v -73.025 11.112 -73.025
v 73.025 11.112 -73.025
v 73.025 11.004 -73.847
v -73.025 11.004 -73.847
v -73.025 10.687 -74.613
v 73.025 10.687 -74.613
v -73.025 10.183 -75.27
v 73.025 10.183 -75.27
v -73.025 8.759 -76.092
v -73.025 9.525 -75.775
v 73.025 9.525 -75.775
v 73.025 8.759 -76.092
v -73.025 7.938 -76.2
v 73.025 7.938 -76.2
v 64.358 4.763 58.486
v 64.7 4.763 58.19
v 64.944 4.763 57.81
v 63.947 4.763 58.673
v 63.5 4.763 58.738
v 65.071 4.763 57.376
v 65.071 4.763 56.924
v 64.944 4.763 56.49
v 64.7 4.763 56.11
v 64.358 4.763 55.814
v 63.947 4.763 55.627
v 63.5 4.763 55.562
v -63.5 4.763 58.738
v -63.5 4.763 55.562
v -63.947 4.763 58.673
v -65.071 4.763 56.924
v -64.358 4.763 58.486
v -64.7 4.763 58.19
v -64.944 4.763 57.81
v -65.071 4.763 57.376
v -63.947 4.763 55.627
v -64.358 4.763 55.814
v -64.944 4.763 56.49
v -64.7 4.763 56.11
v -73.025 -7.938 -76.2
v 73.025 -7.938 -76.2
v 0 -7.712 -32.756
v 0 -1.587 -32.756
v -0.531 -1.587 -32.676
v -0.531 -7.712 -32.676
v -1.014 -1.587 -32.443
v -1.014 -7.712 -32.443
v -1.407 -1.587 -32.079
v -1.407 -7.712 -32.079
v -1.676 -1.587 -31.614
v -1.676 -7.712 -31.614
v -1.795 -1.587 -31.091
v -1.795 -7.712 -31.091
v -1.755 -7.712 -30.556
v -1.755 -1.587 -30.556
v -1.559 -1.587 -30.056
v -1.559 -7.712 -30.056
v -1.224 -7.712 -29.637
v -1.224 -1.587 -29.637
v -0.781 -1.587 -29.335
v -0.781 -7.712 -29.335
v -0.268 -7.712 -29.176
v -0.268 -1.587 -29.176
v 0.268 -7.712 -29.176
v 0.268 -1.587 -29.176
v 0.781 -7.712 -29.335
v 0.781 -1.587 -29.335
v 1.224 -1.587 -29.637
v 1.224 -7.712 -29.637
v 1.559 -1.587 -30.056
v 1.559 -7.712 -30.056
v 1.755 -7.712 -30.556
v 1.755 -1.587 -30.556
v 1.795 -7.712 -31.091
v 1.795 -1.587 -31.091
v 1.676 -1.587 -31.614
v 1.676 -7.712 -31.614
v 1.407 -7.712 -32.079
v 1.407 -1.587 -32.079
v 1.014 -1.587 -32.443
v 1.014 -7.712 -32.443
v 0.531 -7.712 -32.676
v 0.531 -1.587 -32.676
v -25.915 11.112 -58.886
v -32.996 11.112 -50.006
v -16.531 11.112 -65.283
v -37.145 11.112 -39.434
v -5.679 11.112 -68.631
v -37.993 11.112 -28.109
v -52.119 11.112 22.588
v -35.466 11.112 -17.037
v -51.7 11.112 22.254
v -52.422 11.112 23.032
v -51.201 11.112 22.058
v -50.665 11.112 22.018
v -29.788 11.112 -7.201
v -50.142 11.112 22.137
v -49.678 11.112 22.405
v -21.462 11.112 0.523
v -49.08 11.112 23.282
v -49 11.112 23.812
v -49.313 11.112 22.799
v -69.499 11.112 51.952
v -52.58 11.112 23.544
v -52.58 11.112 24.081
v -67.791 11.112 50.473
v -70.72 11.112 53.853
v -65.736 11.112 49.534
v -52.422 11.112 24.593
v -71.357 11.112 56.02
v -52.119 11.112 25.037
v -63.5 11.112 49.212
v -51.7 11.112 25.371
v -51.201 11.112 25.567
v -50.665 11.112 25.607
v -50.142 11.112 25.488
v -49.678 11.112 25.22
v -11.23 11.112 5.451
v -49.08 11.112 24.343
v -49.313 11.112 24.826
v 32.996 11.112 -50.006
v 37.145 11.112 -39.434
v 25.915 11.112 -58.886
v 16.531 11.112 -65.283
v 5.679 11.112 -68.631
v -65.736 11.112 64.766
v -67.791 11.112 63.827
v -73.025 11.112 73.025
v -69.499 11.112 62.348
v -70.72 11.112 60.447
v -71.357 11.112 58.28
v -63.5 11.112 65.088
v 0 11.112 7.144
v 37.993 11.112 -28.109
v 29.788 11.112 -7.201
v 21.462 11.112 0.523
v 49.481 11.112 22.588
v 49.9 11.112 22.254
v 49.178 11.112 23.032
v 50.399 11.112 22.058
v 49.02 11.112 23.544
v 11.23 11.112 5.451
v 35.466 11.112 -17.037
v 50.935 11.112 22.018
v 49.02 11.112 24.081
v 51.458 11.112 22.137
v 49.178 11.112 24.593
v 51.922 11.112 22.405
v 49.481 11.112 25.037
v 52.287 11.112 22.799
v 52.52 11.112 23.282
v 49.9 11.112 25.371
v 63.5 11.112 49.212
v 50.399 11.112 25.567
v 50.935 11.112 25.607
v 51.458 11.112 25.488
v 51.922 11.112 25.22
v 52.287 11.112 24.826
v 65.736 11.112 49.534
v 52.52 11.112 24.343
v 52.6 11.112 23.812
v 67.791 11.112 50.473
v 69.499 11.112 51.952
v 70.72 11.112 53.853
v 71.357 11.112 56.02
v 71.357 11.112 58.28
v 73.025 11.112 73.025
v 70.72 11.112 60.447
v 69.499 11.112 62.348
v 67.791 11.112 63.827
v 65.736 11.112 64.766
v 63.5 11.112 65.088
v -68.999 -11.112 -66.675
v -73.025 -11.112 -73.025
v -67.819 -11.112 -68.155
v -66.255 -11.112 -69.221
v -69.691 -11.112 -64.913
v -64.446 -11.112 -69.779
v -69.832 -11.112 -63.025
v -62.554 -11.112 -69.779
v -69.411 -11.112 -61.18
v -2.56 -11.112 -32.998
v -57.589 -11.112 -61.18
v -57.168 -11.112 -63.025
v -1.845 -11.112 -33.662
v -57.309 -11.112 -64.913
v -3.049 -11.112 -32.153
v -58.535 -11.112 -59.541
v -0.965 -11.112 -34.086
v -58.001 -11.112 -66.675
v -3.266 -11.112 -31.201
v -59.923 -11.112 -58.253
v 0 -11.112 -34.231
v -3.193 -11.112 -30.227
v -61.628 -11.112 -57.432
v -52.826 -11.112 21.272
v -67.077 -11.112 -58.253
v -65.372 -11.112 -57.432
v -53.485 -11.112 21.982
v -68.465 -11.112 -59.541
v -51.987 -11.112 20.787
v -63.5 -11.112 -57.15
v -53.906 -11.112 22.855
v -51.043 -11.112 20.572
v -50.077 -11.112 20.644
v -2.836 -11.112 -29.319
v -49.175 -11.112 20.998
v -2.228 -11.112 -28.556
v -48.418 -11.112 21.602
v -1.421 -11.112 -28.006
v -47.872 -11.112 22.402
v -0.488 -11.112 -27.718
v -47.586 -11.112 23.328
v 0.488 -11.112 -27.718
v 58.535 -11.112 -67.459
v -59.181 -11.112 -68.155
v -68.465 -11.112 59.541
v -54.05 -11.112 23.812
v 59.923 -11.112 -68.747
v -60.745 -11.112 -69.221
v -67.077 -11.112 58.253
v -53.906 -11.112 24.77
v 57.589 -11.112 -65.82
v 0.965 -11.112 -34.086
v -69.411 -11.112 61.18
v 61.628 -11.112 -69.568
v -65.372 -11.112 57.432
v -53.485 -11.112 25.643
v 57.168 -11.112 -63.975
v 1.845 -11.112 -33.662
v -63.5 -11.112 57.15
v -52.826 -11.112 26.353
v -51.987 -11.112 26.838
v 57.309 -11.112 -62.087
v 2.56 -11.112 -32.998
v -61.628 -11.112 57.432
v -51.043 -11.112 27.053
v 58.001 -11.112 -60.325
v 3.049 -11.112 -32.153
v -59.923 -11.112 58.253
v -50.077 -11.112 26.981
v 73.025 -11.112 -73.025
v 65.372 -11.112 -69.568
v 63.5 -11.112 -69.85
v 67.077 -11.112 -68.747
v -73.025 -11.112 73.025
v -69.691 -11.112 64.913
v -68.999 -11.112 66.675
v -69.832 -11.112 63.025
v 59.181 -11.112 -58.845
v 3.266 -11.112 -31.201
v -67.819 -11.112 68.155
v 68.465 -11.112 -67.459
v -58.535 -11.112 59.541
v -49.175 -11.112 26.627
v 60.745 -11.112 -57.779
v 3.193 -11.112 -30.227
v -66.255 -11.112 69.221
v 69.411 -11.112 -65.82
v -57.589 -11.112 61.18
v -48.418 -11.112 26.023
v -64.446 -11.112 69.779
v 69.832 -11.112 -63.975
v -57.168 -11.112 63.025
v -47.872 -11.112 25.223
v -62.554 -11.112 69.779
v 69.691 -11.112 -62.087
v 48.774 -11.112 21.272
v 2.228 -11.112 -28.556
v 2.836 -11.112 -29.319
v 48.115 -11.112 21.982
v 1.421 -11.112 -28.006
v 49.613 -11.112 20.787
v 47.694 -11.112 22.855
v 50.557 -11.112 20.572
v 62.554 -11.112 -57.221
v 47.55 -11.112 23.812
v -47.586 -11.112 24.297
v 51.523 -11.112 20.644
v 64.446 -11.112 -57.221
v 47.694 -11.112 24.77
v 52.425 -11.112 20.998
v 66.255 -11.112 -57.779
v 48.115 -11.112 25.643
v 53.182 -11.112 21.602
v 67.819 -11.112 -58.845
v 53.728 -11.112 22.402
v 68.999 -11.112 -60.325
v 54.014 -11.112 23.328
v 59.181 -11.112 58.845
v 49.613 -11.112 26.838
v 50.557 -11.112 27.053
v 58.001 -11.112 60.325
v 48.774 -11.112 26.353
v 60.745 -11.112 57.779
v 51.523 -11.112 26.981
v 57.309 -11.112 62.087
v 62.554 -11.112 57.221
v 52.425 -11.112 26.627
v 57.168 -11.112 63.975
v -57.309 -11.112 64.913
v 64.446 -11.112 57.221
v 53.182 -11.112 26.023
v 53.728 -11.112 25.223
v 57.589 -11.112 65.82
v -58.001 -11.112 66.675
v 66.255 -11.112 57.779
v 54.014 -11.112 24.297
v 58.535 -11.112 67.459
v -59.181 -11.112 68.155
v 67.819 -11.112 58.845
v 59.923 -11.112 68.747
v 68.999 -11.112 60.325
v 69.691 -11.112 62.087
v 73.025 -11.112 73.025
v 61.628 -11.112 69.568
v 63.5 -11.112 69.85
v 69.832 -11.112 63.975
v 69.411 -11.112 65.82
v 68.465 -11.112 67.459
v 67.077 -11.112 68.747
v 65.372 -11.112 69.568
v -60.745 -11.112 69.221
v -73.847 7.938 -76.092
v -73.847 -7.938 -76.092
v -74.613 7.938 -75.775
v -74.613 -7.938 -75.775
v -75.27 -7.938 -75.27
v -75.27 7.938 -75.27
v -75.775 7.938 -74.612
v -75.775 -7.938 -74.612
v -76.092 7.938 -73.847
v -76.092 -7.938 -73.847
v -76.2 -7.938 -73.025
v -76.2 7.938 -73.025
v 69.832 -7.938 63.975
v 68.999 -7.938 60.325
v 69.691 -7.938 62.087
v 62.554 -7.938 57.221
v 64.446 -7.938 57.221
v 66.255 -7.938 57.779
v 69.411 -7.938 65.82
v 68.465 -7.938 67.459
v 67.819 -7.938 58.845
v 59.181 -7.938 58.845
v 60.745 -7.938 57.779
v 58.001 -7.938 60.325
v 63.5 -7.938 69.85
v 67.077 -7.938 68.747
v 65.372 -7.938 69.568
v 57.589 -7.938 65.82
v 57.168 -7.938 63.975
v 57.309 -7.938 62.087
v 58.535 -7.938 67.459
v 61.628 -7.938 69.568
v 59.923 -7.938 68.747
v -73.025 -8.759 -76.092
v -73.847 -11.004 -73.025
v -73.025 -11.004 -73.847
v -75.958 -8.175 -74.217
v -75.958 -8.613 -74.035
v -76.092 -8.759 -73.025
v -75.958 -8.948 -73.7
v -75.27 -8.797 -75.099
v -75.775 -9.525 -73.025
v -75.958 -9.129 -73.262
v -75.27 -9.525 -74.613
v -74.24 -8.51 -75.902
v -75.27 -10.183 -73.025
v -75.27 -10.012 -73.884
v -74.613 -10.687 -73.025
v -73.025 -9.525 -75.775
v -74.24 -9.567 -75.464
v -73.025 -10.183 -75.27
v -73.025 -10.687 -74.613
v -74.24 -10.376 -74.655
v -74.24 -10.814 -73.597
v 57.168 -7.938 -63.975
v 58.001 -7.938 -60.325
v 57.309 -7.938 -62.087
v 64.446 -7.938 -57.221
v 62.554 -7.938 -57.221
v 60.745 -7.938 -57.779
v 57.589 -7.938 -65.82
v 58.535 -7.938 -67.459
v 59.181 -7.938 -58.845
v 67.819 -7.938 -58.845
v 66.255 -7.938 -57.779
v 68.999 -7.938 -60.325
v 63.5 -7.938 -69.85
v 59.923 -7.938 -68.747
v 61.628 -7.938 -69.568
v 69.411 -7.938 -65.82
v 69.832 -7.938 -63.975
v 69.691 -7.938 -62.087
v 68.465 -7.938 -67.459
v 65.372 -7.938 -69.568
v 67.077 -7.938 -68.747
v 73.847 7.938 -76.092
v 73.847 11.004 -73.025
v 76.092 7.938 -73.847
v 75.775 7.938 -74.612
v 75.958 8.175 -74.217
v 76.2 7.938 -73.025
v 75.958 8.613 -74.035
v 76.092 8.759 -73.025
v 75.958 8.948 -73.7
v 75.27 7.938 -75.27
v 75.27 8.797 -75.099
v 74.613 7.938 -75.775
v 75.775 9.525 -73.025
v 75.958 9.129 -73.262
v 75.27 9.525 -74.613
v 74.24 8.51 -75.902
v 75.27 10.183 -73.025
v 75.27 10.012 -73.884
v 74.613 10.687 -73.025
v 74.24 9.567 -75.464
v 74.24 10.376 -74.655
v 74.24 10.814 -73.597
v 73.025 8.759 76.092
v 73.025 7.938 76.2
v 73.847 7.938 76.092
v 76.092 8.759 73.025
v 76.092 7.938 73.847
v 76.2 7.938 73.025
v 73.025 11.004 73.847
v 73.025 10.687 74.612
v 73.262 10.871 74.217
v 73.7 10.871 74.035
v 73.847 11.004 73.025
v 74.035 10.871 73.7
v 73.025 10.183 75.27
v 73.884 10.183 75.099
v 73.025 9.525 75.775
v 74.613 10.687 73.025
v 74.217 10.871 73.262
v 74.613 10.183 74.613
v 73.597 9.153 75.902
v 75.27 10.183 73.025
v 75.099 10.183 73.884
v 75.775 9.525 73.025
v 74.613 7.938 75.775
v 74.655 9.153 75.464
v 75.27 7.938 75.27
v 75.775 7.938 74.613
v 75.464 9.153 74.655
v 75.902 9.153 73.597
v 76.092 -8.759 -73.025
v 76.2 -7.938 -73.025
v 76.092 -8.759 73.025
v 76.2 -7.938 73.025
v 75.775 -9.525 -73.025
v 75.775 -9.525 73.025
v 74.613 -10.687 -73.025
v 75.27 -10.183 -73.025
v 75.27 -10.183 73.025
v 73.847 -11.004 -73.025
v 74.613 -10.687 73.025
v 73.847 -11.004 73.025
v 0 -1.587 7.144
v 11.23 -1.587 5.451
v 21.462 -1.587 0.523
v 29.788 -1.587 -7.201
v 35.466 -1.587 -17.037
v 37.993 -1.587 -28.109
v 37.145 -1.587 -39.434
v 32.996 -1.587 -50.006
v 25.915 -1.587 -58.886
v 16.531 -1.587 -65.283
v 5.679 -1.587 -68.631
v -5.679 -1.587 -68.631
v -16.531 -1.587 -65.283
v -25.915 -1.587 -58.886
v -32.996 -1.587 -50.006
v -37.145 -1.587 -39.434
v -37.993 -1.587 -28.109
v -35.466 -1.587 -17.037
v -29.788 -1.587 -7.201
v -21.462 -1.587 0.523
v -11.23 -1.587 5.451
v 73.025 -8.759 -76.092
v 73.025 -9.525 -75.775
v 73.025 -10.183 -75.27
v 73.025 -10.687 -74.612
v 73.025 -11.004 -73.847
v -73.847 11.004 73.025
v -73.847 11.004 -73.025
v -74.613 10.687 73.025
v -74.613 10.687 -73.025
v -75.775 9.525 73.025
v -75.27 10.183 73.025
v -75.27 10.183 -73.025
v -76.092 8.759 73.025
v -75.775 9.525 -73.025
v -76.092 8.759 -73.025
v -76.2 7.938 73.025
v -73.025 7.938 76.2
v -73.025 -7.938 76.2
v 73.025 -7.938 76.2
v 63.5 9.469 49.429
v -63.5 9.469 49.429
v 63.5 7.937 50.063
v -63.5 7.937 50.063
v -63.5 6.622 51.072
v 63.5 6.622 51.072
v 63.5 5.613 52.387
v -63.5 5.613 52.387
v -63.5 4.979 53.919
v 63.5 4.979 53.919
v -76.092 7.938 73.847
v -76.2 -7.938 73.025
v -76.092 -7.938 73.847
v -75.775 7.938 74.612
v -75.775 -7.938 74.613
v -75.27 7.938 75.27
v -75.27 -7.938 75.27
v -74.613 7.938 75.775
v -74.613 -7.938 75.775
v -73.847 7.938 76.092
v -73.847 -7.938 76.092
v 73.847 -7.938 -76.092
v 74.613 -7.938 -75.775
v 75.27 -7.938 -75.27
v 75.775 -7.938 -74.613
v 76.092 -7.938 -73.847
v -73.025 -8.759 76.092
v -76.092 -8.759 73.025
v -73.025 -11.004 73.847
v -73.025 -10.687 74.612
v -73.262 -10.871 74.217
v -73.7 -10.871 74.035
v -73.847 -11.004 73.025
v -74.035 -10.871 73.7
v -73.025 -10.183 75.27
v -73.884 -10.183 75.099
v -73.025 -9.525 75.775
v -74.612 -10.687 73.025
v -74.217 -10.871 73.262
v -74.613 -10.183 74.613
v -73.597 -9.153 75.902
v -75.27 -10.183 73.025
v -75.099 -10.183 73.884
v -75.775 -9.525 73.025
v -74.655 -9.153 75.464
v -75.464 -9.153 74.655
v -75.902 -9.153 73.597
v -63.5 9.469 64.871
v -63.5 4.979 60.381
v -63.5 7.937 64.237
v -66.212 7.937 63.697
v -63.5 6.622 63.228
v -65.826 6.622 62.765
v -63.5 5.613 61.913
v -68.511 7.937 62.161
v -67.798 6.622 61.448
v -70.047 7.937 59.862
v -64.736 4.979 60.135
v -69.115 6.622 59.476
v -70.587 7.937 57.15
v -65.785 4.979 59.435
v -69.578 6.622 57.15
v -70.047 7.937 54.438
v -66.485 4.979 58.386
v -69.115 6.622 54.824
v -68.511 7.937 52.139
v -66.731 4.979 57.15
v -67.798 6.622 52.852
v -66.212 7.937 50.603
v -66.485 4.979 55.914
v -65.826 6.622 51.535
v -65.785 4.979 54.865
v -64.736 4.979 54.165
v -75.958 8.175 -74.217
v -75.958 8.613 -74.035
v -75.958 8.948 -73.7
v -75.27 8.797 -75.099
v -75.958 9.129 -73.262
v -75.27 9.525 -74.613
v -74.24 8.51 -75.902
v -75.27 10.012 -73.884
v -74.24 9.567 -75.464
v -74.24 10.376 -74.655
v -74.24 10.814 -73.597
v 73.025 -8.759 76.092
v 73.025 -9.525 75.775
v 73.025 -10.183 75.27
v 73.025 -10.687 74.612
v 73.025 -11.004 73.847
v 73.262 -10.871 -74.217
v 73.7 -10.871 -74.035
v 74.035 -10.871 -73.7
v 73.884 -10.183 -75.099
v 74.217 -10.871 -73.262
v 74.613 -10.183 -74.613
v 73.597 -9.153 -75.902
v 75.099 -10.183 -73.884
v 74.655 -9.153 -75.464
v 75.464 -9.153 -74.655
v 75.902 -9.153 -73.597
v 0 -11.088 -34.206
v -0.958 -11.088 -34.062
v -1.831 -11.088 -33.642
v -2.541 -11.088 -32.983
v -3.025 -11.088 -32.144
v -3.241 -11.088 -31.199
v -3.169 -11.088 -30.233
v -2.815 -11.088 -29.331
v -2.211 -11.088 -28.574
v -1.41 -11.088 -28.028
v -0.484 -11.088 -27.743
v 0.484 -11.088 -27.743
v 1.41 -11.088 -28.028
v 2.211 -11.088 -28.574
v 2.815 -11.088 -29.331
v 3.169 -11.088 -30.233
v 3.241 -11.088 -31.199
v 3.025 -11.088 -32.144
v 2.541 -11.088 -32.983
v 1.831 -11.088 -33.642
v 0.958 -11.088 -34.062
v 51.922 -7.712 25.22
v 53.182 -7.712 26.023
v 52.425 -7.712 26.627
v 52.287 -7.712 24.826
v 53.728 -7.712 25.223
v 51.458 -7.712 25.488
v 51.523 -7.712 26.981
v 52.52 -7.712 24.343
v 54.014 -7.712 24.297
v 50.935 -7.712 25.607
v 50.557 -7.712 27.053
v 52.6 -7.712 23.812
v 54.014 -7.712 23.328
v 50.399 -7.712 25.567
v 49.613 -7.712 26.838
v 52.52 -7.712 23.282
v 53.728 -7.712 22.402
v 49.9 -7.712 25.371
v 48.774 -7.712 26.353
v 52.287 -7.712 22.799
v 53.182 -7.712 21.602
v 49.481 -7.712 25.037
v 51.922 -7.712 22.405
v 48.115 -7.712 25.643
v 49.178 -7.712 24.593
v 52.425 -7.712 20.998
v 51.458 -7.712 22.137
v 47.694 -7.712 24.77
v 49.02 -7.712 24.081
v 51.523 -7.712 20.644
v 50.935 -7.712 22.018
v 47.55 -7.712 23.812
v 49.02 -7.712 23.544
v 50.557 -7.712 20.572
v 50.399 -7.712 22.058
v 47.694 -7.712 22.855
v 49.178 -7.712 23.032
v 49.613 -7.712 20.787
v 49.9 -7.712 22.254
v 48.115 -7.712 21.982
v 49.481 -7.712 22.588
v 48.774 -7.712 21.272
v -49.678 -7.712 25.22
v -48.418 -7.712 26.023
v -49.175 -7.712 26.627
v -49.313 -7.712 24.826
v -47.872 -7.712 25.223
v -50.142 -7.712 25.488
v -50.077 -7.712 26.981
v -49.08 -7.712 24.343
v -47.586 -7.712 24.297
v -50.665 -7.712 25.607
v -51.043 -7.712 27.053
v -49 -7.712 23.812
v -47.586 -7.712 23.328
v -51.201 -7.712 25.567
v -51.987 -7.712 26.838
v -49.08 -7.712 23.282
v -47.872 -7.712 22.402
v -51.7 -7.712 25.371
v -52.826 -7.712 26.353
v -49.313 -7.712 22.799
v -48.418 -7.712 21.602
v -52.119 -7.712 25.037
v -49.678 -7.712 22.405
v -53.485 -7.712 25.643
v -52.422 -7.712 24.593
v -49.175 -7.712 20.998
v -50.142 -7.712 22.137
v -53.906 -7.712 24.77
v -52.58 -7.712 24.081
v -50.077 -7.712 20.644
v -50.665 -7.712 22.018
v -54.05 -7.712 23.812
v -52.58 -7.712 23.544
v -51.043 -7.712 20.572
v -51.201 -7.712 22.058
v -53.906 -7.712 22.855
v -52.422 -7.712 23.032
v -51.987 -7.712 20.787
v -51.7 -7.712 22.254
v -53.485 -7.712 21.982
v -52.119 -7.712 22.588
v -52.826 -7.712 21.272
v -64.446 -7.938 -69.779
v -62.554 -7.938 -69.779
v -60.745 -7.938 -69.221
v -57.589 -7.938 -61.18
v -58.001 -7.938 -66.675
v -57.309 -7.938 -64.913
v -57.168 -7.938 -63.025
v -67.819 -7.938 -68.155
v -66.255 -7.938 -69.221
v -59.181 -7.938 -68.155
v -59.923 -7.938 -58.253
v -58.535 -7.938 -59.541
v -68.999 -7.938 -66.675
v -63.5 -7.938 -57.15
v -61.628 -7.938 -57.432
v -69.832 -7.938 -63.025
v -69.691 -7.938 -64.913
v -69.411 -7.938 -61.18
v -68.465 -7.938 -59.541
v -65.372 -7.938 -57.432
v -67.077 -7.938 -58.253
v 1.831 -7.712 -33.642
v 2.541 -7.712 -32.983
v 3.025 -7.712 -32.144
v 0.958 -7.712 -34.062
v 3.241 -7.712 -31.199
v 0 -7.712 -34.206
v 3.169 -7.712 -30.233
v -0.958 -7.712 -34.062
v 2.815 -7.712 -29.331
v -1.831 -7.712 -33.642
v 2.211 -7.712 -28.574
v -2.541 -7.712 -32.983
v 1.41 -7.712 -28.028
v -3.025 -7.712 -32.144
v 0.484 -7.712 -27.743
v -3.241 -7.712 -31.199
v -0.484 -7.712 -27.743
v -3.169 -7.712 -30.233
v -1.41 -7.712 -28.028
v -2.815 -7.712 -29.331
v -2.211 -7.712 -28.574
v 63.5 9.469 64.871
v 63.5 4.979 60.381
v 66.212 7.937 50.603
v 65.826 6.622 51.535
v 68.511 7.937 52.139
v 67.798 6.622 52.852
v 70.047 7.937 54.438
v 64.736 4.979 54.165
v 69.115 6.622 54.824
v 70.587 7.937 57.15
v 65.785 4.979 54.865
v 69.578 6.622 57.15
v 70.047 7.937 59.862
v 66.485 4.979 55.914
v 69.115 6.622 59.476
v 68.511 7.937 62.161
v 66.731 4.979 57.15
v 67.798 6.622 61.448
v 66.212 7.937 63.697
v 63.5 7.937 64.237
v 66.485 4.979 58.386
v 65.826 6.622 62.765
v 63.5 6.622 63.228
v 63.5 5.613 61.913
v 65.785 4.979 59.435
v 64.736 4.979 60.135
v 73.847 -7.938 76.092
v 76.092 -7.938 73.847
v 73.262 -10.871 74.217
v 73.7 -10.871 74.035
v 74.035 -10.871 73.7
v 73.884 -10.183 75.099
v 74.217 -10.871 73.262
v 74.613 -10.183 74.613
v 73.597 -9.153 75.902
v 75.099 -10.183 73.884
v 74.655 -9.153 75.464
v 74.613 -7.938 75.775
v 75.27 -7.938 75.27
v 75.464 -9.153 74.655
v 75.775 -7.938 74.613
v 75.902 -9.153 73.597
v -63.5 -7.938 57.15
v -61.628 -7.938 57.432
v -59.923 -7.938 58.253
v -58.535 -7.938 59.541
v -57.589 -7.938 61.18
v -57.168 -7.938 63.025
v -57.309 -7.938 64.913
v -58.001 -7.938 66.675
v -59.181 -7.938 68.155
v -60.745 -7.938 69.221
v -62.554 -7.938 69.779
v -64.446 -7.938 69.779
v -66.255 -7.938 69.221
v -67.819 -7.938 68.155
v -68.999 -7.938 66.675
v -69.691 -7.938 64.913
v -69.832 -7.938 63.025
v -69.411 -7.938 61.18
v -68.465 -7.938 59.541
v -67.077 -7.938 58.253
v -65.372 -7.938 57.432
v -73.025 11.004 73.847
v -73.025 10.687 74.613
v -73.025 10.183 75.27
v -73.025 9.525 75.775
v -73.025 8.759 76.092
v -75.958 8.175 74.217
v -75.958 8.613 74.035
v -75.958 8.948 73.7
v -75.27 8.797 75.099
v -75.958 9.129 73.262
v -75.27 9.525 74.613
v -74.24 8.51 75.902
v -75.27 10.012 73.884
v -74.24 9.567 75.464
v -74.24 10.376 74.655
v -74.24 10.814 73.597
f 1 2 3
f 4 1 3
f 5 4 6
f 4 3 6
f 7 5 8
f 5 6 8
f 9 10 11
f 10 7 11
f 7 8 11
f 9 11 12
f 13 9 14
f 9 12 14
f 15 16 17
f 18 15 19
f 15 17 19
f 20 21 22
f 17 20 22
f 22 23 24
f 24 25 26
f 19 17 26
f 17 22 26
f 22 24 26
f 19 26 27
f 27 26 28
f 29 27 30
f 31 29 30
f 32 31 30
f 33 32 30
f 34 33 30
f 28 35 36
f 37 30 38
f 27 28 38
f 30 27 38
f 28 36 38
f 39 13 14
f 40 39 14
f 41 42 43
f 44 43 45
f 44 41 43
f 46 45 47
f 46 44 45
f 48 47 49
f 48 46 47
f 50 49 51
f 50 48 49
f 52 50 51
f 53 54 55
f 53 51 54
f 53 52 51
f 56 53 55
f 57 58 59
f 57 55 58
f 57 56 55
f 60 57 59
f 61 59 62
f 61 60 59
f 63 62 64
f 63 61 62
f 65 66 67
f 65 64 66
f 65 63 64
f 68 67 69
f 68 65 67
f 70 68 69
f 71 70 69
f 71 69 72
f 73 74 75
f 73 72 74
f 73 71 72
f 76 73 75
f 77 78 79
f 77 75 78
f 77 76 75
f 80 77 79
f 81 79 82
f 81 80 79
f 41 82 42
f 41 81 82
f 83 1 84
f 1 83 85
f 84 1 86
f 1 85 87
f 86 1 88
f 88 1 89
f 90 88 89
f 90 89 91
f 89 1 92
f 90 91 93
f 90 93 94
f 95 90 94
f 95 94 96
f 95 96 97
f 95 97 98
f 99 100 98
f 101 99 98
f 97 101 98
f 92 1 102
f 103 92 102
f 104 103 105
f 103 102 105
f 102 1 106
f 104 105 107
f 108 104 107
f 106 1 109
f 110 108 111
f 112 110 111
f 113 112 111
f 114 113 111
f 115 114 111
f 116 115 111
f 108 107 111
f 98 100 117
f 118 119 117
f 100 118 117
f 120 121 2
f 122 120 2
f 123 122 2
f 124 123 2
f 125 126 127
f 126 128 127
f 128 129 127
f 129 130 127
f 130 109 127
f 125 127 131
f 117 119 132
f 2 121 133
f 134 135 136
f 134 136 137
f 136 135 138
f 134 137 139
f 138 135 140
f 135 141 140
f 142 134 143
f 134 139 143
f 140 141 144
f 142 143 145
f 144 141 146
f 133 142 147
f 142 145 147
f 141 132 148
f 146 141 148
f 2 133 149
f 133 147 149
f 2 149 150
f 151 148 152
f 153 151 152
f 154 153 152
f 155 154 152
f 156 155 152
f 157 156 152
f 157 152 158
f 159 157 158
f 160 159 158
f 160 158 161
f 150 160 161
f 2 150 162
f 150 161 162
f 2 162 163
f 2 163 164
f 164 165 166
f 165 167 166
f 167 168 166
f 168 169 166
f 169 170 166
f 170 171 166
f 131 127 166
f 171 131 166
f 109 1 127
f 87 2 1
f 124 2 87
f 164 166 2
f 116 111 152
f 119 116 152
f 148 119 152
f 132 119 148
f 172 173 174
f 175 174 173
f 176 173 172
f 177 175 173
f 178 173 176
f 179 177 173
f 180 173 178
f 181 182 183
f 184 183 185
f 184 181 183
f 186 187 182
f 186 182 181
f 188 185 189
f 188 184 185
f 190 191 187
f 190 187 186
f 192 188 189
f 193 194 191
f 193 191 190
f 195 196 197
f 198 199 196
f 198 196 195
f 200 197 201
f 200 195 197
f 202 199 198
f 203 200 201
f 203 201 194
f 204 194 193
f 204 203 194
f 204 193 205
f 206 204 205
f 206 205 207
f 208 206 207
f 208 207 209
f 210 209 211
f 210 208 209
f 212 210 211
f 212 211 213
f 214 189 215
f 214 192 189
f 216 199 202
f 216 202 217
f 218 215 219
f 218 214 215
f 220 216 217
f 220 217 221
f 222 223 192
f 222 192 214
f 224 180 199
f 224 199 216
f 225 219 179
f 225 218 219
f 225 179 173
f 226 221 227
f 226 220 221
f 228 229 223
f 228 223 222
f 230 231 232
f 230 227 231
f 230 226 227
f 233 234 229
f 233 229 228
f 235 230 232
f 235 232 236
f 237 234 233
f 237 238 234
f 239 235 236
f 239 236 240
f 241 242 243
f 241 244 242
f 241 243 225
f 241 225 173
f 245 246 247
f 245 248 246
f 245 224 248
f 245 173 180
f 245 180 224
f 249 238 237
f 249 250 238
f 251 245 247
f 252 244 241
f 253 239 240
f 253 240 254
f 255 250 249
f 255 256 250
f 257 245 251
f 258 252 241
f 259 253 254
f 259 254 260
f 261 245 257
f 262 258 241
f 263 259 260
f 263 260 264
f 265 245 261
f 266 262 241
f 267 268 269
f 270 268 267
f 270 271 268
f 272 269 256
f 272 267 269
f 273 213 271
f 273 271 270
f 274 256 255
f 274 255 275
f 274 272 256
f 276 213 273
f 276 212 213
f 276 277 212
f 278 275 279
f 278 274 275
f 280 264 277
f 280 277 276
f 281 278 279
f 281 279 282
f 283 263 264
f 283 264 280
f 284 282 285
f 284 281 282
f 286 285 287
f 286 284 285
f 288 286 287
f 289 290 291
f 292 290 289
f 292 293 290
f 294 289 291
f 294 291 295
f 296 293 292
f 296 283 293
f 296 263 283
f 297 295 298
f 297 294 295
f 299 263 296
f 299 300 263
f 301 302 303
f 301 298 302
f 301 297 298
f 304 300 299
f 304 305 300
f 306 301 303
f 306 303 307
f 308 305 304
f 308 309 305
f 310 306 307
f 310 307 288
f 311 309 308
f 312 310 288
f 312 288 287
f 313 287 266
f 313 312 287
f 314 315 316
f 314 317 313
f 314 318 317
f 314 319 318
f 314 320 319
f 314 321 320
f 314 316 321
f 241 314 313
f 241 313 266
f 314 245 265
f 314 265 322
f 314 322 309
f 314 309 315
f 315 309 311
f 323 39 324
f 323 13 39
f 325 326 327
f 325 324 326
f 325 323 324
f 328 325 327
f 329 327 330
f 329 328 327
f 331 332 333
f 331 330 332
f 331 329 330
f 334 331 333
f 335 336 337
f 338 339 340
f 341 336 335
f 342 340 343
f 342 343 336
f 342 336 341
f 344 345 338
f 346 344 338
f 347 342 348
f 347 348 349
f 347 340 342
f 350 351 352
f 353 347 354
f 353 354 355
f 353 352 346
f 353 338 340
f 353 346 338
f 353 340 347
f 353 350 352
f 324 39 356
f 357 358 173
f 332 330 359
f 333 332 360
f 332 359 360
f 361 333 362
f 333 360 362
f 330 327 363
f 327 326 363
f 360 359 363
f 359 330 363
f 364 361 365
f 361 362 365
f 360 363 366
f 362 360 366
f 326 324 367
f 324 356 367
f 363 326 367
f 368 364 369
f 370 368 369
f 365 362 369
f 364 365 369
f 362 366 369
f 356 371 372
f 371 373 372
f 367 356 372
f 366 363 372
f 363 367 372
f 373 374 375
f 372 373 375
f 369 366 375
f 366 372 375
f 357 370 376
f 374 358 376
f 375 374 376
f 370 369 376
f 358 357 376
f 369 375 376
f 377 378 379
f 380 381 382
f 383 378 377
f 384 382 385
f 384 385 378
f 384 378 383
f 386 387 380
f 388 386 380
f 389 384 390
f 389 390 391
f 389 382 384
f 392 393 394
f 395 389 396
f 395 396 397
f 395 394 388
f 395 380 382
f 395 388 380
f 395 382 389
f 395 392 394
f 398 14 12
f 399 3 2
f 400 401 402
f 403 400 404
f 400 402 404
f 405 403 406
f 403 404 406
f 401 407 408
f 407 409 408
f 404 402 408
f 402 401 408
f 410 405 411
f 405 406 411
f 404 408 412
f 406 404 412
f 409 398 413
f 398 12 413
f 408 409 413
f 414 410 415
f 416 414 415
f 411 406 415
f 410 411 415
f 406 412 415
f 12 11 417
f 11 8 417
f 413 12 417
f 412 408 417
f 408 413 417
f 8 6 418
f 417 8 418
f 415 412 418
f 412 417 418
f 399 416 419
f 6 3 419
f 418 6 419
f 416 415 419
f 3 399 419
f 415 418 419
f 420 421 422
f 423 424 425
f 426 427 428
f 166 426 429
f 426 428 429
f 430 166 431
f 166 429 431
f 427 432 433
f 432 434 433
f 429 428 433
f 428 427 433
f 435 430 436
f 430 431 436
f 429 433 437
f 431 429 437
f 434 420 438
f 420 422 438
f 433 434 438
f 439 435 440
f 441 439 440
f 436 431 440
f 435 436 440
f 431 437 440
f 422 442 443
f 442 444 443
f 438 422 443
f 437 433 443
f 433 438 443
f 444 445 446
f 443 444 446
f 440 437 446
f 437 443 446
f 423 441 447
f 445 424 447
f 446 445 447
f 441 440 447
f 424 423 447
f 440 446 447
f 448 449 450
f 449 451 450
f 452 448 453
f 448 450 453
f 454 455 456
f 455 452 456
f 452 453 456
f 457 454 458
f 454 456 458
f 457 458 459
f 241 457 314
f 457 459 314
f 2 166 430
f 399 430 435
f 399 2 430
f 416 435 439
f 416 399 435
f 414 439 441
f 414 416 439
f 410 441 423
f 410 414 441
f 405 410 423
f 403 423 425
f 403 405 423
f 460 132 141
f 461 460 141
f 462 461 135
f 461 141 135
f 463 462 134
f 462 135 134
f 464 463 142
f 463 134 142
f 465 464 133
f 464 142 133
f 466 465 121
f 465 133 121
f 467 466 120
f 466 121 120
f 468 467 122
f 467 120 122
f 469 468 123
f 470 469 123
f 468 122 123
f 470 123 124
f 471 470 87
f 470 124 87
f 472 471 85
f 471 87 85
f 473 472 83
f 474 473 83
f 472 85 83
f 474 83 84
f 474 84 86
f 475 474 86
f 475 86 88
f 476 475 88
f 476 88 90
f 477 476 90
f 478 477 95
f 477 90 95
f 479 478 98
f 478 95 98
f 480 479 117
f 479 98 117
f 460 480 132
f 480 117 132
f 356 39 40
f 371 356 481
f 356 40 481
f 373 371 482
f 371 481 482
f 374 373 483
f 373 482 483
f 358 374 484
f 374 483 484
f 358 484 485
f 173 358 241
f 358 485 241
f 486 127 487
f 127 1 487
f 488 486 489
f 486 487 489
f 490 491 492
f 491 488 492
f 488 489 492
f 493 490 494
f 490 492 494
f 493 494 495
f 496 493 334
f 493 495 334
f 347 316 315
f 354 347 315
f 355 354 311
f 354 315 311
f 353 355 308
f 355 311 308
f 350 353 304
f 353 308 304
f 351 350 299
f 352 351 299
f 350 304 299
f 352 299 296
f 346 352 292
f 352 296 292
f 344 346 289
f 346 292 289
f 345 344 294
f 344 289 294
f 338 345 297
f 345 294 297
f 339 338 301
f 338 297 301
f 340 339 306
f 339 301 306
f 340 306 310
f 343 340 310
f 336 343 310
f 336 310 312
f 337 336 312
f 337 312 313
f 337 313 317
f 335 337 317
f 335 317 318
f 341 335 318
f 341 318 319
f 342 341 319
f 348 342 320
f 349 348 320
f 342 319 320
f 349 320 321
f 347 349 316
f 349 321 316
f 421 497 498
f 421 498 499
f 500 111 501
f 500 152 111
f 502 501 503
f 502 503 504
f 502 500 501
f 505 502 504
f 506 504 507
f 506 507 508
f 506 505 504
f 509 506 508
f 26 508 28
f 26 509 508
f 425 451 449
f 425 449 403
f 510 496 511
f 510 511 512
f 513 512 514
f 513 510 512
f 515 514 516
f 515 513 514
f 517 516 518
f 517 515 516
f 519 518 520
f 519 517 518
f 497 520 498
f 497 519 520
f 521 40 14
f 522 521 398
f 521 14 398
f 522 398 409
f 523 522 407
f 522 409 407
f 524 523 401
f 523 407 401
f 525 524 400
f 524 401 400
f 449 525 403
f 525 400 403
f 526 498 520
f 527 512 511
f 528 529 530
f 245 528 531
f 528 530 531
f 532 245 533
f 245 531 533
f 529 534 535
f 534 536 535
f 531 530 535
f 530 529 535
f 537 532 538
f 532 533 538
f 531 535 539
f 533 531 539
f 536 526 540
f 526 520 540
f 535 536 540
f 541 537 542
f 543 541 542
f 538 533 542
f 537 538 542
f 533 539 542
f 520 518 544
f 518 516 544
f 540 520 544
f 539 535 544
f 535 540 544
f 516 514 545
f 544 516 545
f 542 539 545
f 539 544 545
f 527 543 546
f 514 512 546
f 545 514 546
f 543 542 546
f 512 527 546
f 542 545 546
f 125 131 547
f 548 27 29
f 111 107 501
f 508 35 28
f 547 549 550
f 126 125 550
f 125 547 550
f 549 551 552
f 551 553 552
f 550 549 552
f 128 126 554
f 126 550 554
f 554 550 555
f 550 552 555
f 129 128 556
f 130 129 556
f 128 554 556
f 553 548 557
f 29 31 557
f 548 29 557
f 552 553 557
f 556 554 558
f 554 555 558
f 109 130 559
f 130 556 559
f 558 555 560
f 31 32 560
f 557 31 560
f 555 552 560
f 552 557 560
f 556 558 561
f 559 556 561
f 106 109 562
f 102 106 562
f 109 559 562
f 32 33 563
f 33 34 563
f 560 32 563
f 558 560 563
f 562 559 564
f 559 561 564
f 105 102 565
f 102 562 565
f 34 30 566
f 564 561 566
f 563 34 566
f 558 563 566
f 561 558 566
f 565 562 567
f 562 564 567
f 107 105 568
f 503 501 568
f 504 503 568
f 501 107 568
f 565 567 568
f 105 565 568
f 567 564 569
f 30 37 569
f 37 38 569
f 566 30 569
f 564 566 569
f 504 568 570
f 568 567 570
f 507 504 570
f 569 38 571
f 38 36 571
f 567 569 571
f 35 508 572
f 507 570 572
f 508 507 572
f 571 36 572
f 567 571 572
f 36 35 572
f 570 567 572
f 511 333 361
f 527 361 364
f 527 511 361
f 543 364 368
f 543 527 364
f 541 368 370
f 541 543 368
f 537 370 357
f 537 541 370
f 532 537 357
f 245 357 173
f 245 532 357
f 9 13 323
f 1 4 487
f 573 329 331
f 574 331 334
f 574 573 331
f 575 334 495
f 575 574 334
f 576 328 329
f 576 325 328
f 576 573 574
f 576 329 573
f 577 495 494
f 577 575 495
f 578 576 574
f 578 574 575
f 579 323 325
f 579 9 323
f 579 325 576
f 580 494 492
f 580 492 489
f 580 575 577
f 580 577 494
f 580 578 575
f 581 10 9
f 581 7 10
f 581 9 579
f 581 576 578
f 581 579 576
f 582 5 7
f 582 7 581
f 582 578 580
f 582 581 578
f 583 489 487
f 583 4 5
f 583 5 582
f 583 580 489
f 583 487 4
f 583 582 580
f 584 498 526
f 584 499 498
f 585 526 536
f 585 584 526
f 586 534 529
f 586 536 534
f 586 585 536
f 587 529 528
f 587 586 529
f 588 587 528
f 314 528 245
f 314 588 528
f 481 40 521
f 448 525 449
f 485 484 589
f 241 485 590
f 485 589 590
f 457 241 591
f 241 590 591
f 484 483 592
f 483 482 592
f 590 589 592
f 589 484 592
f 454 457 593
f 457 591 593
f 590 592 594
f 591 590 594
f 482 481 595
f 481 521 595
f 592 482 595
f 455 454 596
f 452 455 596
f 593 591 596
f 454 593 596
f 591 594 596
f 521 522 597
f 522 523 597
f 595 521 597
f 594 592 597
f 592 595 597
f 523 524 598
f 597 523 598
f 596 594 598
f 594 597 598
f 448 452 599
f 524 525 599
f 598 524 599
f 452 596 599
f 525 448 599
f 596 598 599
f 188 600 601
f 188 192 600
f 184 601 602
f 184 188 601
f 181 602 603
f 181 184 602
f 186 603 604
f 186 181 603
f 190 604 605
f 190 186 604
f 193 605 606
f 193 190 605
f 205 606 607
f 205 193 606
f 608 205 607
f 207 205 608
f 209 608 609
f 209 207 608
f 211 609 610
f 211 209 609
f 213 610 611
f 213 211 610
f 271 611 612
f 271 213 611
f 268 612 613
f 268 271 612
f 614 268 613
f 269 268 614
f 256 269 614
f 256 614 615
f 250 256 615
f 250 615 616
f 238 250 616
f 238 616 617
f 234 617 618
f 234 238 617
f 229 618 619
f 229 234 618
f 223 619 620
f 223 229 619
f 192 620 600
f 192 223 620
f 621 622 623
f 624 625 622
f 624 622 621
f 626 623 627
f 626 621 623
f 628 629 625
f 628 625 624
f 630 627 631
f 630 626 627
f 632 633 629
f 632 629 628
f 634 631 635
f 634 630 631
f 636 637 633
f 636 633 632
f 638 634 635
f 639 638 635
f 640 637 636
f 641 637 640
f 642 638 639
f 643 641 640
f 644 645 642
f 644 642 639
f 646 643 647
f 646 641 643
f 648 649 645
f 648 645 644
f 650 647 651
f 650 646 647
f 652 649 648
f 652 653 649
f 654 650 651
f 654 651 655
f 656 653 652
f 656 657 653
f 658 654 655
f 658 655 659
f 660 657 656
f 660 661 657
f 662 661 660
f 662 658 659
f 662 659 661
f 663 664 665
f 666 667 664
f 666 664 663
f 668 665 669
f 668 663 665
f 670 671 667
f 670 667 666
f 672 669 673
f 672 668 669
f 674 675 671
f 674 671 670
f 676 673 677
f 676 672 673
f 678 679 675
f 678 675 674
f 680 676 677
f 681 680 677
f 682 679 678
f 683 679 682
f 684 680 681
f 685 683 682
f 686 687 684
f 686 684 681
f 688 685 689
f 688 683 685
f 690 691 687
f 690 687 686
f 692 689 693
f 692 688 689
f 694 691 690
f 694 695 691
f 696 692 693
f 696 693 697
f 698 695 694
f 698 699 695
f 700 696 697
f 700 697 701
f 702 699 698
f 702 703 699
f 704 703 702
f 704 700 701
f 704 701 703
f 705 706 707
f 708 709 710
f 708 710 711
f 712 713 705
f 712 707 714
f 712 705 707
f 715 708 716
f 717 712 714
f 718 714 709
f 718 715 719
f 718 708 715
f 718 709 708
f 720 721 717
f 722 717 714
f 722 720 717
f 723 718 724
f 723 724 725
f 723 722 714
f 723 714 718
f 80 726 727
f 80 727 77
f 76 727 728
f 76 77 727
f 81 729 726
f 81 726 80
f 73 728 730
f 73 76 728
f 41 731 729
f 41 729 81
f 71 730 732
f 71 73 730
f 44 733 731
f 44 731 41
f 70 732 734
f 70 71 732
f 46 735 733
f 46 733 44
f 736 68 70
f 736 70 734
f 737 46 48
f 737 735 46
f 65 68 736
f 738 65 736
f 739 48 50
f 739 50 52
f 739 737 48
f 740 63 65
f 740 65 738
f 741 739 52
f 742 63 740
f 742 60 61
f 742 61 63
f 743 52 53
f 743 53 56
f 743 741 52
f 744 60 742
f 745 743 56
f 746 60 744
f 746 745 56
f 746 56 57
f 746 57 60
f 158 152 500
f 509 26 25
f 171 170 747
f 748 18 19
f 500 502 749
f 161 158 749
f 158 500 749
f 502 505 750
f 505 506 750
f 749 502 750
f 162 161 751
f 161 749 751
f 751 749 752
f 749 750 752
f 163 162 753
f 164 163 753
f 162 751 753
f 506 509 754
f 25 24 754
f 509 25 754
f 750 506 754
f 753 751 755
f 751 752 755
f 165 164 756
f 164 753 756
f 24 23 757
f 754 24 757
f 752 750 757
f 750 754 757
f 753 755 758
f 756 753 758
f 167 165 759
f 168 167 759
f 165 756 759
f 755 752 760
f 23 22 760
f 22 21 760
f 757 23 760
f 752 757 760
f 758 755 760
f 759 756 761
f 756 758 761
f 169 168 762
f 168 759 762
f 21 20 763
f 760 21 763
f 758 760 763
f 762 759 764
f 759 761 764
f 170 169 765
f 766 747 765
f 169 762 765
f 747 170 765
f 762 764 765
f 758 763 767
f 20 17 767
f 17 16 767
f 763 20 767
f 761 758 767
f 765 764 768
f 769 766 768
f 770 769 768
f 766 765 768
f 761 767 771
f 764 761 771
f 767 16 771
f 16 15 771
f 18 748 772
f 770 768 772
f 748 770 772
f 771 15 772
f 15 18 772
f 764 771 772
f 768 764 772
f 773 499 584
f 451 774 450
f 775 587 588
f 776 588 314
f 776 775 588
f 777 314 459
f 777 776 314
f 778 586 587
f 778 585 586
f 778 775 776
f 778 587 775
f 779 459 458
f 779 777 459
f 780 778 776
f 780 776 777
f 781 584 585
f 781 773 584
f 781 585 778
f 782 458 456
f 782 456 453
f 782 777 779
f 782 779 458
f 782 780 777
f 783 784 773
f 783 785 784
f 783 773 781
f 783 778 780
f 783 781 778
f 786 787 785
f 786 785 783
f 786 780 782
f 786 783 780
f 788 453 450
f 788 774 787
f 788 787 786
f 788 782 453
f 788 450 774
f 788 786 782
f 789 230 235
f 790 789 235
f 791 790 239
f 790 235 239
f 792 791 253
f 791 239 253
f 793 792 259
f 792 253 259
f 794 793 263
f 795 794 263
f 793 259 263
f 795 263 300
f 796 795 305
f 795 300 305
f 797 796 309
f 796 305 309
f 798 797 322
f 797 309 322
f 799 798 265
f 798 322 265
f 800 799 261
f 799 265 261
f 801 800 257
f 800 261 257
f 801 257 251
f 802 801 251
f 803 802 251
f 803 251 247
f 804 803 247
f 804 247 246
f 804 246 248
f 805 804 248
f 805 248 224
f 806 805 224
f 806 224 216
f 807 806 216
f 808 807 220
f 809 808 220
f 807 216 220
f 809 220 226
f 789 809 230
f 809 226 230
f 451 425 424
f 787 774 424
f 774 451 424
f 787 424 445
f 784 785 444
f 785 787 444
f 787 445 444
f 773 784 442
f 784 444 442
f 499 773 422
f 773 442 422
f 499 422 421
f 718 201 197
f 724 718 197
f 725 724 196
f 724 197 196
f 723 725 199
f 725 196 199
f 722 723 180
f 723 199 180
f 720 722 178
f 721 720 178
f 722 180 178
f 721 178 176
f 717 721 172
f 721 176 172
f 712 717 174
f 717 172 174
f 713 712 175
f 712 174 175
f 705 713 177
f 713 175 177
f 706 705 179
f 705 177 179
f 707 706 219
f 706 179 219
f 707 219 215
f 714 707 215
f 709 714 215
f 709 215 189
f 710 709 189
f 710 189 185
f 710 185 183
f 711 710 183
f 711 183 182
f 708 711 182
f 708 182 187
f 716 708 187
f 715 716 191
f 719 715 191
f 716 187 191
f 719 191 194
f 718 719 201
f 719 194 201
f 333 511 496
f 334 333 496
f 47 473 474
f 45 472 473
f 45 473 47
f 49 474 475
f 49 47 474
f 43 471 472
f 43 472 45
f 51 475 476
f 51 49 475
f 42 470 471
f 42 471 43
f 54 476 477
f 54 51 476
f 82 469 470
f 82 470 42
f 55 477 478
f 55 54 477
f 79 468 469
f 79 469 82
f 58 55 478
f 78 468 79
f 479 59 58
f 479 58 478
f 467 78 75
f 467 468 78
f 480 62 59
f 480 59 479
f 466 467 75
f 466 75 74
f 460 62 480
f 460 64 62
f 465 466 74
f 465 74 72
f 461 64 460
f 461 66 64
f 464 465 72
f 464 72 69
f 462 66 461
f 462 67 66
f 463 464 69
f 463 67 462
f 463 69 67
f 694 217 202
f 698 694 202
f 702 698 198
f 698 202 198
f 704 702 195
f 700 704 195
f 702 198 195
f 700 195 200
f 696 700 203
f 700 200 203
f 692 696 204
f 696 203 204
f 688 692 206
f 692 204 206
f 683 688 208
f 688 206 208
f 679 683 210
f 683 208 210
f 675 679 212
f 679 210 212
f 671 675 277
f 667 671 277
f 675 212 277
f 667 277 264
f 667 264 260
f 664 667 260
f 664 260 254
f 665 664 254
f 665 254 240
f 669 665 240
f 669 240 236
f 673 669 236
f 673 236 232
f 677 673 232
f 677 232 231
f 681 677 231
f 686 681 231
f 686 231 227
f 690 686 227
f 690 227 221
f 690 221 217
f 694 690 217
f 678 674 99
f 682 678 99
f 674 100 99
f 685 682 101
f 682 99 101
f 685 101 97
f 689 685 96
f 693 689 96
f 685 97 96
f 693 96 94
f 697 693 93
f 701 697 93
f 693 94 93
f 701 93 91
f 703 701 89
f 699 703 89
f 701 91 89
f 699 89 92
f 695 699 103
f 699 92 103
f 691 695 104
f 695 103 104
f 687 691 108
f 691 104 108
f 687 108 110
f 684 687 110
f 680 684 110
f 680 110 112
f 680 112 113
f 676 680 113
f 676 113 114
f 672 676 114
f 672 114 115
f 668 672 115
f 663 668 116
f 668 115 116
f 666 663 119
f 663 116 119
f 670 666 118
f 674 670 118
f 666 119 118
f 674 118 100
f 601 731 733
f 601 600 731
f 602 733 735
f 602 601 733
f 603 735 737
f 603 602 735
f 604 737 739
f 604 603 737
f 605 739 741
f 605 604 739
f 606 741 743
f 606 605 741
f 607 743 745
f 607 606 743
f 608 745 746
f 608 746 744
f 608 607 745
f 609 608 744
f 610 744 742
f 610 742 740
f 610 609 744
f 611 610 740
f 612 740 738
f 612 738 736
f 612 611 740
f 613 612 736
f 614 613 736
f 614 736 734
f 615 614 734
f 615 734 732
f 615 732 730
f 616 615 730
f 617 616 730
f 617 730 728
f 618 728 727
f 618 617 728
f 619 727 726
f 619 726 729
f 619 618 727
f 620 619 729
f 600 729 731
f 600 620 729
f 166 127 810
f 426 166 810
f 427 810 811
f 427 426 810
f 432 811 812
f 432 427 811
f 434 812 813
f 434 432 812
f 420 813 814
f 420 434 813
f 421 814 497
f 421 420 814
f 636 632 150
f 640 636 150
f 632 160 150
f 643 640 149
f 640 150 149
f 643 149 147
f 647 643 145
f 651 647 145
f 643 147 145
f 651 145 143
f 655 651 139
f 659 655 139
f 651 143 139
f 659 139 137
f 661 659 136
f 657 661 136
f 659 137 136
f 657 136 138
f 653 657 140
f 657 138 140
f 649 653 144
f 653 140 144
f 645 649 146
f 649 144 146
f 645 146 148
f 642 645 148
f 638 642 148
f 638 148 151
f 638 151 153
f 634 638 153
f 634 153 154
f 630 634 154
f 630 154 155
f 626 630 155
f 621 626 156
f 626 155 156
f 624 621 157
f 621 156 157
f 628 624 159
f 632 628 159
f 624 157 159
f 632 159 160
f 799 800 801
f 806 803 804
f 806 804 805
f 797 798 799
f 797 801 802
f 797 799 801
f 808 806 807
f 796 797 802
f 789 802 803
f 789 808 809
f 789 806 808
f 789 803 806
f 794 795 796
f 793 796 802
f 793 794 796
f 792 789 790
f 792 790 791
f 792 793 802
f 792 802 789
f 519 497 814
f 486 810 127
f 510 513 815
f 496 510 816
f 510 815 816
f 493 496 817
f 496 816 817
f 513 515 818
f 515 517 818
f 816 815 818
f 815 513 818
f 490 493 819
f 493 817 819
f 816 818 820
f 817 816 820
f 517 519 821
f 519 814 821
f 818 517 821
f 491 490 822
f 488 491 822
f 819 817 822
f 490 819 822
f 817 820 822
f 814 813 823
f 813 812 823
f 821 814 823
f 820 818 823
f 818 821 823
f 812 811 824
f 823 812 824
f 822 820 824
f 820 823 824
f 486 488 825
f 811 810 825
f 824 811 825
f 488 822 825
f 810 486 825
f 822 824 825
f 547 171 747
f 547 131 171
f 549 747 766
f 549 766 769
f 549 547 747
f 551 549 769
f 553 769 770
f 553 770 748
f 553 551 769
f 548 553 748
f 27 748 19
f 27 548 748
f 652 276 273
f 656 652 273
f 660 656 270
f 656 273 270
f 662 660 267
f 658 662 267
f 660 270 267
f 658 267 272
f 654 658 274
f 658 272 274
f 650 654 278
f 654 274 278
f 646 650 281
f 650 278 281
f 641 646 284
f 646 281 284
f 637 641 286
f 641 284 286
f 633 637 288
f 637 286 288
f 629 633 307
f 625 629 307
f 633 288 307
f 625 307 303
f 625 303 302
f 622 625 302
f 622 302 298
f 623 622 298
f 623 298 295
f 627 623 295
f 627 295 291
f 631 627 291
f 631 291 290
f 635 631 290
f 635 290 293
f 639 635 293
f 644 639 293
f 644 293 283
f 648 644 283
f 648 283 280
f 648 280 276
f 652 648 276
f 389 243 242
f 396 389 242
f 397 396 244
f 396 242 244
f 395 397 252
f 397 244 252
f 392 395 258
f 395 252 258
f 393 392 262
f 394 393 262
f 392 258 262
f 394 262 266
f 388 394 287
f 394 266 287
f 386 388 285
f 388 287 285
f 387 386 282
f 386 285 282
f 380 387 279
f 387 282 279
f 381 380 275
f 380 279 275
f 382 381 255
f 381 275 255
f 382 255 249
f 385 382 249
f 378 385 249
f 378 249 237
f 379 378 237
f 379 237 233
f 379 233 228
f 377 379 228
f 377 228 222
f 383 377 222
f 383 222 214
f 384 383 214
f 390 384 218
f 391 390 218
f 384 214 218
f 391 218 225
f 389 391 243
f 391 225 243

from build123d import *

# Parameters (mm, degrees)
SKETCH3_W                                           = 152.4
SKETCH3_H                                           = 22.225
BOSS_EXTRUDE1_DEPTH                                 = 76.2
FEET_R                                              = 6.35
RUBBER_FEET_DEPTH                                   = 3.175
CUT_EXTRUDE2_DEPTH                                  = 6.35
FILLET2_R                                           = 6.35
FILLET1_R                                           = 3.175
CBORE_FOR_M3_HEX_SOCKET_HEAD_CAP_SCREW1_D           = 3.6
CBORE_FOR_M3_HEX_SOCKET_HEAD_CAP_SCREW1_CBORE_D     = 6.5
CBORE_FOR_M3_HEX_SOCKET_HEAD_CAP_SCREW1_CBORE_DEPTH = 3.4
SKETCH10_R                                          = 38.1
CUT_EXTRUDE3_DEPTH                                  = 12.7


with BuildPart() as part:
    # Sketch3 → Boss-Extrude1 (new, symmetric)
    with BuildSketch(Plane.XY):
        Rectangle(SKETCH3_W, SKETCH3_H)
    extrude(amount=BOSS_EXTRUDE1_DEPTH, both=True)

    # Feet → Rubber Feet (cut)
    with BuildSketch(Plane.XZ.offset(11.1125)):
        with Locations(Location((-63.5, 63.5, 0), (0, 0, 270))):
            Circle(FEET_R)
        with Locations(Location((63.5, 63.5, 0), (0, 0, 90))):
            Circle(FEET_R)
        with Locations(Location((63.5, -63.5, 0), (0, 0, 270))):
            Circle(FEET_R)
        with Locations(Location((-63.5, -63.5, 0), (0, 0, 90))):
            Circle(FEET_R)
    extrude(amount=-RUBBER_FEET_DEPTH, mode=Mode.SUBTRACT)

    # Sketch6 → Cut-Extrude2 (cut)
    with BuildSketch(Plane(origin=(0, 11.1125, 0), x_dir=(1, 0, 0), z_dir=(0, 1, 0))):
        with BuildLine():
            Line((-63.5, -49.2125), (63.5, -49.2125))
            ThreePointArc((63.5, -49.2125), (71.4375, -57.15), (63.5, -65.0875))
            Line((63.5, -65.0875), (-63.5, -65.0875))
            ThreePointArc((-63.5, -65.0875), (-71.4375, -57.15), (-63.5, -49.2125))
        make_face()
    extrude(amount=-CUT_EXTRUDE2_DEPTH, mode=Mode.SUBTRACT)

    # Fillet2
    fillet2_edges = [part.edges().sort_by_distance(p)[0] for p in [
        (0, 4.7625, 49.2125),
        (71.4375, 4.7625, 57.15),
        (0, 4.7625, 65.0875),
        (-71.4375, 4.7625, 57.15),
    ]]
    fillet(fillet2_edges, radius=FILLET2_R - 0.0001)  # a hair under: the kernel refuses the full size

    # Fillet1
    fillet1_edges = [part.edges().sort_by_distance(p)[0] for p in [
        (76.2, 0, 76.2),
        (0, 11.1125, 76.2),
        (-76.2, 0, 76.2),
        (0, 11.1125, -76.2),
        (76.2, 0, -76.2),
        (0, -11.1125, -76.2),
        (-76.2, 0, -76.2),
        (0, -11.1125, 76.2),
        (-76.2, 11.1125, 0),
        (76.2, 11.1125, 0),
        (76.2, -11.1125, 0),
        (-76.2, -11.1125, 0),
    ]]
    fillet(fillet1_edges, radius=FILLET1_R)

    # CBORE for M3 Hex Socket Head Cap Screw1 (through all)
    with Locations(Plane(origin=(0, -11.1125, 0), x_dir=(-1, 0, 0), z_dir=(0, -1, 0))):
        with Locations((-50.8, -23.8125), (50.8, -23.8125)):
            CounterBoreHole(CBORE_FOR_M3_HEX_SOCKET_HEAD_CAP_SCREW1_D / 2, CBORE_FOR_M3_HEX_SOCKET_HEAD_CAP_SCREW1_CBORE_D / 2, CBORE_FOR_M3_HEX_SOCKET_HEAD_CAP_SCREW1_CBORE_DEPTH)

    # Sketch10 → Cut-Extrude3 (cut)
    with BuildSketch(Plane(origin=(0, 11.1125, 0), x_dir=(1, 0, 0), z_dir=(0, 1, 0))):
        with Locations(Location((0, 30.95625, 0), (0, 0, 270))):
            Circle(SKETCH10_R)
    extrude(amount=-CUT_EXTRUDE3_DEPTH, mode=Mode.SUBTRACT)

    # Sketch13 → CBORE for M3 Hex Socket Head Cap Screw2 (revolve, cut)
    with BuildSketch(Plane(origin=(0, -11.1125, -30.95625), x_dir=(0, 0, -1), z_dir=(1, 0, 0))):
        Polygon((0, 0), (0, 22.225), (1.8, 22.225), (1.8, 3.4), (3.25, 3.4), (3.25, 0.025), (3.275, 0), align=None)
    revolve(axis=Axis((0, -17.4625, -30.95625), (0, 1, 0)), mode=Mode.SUBTRACT)


solid = part.part
